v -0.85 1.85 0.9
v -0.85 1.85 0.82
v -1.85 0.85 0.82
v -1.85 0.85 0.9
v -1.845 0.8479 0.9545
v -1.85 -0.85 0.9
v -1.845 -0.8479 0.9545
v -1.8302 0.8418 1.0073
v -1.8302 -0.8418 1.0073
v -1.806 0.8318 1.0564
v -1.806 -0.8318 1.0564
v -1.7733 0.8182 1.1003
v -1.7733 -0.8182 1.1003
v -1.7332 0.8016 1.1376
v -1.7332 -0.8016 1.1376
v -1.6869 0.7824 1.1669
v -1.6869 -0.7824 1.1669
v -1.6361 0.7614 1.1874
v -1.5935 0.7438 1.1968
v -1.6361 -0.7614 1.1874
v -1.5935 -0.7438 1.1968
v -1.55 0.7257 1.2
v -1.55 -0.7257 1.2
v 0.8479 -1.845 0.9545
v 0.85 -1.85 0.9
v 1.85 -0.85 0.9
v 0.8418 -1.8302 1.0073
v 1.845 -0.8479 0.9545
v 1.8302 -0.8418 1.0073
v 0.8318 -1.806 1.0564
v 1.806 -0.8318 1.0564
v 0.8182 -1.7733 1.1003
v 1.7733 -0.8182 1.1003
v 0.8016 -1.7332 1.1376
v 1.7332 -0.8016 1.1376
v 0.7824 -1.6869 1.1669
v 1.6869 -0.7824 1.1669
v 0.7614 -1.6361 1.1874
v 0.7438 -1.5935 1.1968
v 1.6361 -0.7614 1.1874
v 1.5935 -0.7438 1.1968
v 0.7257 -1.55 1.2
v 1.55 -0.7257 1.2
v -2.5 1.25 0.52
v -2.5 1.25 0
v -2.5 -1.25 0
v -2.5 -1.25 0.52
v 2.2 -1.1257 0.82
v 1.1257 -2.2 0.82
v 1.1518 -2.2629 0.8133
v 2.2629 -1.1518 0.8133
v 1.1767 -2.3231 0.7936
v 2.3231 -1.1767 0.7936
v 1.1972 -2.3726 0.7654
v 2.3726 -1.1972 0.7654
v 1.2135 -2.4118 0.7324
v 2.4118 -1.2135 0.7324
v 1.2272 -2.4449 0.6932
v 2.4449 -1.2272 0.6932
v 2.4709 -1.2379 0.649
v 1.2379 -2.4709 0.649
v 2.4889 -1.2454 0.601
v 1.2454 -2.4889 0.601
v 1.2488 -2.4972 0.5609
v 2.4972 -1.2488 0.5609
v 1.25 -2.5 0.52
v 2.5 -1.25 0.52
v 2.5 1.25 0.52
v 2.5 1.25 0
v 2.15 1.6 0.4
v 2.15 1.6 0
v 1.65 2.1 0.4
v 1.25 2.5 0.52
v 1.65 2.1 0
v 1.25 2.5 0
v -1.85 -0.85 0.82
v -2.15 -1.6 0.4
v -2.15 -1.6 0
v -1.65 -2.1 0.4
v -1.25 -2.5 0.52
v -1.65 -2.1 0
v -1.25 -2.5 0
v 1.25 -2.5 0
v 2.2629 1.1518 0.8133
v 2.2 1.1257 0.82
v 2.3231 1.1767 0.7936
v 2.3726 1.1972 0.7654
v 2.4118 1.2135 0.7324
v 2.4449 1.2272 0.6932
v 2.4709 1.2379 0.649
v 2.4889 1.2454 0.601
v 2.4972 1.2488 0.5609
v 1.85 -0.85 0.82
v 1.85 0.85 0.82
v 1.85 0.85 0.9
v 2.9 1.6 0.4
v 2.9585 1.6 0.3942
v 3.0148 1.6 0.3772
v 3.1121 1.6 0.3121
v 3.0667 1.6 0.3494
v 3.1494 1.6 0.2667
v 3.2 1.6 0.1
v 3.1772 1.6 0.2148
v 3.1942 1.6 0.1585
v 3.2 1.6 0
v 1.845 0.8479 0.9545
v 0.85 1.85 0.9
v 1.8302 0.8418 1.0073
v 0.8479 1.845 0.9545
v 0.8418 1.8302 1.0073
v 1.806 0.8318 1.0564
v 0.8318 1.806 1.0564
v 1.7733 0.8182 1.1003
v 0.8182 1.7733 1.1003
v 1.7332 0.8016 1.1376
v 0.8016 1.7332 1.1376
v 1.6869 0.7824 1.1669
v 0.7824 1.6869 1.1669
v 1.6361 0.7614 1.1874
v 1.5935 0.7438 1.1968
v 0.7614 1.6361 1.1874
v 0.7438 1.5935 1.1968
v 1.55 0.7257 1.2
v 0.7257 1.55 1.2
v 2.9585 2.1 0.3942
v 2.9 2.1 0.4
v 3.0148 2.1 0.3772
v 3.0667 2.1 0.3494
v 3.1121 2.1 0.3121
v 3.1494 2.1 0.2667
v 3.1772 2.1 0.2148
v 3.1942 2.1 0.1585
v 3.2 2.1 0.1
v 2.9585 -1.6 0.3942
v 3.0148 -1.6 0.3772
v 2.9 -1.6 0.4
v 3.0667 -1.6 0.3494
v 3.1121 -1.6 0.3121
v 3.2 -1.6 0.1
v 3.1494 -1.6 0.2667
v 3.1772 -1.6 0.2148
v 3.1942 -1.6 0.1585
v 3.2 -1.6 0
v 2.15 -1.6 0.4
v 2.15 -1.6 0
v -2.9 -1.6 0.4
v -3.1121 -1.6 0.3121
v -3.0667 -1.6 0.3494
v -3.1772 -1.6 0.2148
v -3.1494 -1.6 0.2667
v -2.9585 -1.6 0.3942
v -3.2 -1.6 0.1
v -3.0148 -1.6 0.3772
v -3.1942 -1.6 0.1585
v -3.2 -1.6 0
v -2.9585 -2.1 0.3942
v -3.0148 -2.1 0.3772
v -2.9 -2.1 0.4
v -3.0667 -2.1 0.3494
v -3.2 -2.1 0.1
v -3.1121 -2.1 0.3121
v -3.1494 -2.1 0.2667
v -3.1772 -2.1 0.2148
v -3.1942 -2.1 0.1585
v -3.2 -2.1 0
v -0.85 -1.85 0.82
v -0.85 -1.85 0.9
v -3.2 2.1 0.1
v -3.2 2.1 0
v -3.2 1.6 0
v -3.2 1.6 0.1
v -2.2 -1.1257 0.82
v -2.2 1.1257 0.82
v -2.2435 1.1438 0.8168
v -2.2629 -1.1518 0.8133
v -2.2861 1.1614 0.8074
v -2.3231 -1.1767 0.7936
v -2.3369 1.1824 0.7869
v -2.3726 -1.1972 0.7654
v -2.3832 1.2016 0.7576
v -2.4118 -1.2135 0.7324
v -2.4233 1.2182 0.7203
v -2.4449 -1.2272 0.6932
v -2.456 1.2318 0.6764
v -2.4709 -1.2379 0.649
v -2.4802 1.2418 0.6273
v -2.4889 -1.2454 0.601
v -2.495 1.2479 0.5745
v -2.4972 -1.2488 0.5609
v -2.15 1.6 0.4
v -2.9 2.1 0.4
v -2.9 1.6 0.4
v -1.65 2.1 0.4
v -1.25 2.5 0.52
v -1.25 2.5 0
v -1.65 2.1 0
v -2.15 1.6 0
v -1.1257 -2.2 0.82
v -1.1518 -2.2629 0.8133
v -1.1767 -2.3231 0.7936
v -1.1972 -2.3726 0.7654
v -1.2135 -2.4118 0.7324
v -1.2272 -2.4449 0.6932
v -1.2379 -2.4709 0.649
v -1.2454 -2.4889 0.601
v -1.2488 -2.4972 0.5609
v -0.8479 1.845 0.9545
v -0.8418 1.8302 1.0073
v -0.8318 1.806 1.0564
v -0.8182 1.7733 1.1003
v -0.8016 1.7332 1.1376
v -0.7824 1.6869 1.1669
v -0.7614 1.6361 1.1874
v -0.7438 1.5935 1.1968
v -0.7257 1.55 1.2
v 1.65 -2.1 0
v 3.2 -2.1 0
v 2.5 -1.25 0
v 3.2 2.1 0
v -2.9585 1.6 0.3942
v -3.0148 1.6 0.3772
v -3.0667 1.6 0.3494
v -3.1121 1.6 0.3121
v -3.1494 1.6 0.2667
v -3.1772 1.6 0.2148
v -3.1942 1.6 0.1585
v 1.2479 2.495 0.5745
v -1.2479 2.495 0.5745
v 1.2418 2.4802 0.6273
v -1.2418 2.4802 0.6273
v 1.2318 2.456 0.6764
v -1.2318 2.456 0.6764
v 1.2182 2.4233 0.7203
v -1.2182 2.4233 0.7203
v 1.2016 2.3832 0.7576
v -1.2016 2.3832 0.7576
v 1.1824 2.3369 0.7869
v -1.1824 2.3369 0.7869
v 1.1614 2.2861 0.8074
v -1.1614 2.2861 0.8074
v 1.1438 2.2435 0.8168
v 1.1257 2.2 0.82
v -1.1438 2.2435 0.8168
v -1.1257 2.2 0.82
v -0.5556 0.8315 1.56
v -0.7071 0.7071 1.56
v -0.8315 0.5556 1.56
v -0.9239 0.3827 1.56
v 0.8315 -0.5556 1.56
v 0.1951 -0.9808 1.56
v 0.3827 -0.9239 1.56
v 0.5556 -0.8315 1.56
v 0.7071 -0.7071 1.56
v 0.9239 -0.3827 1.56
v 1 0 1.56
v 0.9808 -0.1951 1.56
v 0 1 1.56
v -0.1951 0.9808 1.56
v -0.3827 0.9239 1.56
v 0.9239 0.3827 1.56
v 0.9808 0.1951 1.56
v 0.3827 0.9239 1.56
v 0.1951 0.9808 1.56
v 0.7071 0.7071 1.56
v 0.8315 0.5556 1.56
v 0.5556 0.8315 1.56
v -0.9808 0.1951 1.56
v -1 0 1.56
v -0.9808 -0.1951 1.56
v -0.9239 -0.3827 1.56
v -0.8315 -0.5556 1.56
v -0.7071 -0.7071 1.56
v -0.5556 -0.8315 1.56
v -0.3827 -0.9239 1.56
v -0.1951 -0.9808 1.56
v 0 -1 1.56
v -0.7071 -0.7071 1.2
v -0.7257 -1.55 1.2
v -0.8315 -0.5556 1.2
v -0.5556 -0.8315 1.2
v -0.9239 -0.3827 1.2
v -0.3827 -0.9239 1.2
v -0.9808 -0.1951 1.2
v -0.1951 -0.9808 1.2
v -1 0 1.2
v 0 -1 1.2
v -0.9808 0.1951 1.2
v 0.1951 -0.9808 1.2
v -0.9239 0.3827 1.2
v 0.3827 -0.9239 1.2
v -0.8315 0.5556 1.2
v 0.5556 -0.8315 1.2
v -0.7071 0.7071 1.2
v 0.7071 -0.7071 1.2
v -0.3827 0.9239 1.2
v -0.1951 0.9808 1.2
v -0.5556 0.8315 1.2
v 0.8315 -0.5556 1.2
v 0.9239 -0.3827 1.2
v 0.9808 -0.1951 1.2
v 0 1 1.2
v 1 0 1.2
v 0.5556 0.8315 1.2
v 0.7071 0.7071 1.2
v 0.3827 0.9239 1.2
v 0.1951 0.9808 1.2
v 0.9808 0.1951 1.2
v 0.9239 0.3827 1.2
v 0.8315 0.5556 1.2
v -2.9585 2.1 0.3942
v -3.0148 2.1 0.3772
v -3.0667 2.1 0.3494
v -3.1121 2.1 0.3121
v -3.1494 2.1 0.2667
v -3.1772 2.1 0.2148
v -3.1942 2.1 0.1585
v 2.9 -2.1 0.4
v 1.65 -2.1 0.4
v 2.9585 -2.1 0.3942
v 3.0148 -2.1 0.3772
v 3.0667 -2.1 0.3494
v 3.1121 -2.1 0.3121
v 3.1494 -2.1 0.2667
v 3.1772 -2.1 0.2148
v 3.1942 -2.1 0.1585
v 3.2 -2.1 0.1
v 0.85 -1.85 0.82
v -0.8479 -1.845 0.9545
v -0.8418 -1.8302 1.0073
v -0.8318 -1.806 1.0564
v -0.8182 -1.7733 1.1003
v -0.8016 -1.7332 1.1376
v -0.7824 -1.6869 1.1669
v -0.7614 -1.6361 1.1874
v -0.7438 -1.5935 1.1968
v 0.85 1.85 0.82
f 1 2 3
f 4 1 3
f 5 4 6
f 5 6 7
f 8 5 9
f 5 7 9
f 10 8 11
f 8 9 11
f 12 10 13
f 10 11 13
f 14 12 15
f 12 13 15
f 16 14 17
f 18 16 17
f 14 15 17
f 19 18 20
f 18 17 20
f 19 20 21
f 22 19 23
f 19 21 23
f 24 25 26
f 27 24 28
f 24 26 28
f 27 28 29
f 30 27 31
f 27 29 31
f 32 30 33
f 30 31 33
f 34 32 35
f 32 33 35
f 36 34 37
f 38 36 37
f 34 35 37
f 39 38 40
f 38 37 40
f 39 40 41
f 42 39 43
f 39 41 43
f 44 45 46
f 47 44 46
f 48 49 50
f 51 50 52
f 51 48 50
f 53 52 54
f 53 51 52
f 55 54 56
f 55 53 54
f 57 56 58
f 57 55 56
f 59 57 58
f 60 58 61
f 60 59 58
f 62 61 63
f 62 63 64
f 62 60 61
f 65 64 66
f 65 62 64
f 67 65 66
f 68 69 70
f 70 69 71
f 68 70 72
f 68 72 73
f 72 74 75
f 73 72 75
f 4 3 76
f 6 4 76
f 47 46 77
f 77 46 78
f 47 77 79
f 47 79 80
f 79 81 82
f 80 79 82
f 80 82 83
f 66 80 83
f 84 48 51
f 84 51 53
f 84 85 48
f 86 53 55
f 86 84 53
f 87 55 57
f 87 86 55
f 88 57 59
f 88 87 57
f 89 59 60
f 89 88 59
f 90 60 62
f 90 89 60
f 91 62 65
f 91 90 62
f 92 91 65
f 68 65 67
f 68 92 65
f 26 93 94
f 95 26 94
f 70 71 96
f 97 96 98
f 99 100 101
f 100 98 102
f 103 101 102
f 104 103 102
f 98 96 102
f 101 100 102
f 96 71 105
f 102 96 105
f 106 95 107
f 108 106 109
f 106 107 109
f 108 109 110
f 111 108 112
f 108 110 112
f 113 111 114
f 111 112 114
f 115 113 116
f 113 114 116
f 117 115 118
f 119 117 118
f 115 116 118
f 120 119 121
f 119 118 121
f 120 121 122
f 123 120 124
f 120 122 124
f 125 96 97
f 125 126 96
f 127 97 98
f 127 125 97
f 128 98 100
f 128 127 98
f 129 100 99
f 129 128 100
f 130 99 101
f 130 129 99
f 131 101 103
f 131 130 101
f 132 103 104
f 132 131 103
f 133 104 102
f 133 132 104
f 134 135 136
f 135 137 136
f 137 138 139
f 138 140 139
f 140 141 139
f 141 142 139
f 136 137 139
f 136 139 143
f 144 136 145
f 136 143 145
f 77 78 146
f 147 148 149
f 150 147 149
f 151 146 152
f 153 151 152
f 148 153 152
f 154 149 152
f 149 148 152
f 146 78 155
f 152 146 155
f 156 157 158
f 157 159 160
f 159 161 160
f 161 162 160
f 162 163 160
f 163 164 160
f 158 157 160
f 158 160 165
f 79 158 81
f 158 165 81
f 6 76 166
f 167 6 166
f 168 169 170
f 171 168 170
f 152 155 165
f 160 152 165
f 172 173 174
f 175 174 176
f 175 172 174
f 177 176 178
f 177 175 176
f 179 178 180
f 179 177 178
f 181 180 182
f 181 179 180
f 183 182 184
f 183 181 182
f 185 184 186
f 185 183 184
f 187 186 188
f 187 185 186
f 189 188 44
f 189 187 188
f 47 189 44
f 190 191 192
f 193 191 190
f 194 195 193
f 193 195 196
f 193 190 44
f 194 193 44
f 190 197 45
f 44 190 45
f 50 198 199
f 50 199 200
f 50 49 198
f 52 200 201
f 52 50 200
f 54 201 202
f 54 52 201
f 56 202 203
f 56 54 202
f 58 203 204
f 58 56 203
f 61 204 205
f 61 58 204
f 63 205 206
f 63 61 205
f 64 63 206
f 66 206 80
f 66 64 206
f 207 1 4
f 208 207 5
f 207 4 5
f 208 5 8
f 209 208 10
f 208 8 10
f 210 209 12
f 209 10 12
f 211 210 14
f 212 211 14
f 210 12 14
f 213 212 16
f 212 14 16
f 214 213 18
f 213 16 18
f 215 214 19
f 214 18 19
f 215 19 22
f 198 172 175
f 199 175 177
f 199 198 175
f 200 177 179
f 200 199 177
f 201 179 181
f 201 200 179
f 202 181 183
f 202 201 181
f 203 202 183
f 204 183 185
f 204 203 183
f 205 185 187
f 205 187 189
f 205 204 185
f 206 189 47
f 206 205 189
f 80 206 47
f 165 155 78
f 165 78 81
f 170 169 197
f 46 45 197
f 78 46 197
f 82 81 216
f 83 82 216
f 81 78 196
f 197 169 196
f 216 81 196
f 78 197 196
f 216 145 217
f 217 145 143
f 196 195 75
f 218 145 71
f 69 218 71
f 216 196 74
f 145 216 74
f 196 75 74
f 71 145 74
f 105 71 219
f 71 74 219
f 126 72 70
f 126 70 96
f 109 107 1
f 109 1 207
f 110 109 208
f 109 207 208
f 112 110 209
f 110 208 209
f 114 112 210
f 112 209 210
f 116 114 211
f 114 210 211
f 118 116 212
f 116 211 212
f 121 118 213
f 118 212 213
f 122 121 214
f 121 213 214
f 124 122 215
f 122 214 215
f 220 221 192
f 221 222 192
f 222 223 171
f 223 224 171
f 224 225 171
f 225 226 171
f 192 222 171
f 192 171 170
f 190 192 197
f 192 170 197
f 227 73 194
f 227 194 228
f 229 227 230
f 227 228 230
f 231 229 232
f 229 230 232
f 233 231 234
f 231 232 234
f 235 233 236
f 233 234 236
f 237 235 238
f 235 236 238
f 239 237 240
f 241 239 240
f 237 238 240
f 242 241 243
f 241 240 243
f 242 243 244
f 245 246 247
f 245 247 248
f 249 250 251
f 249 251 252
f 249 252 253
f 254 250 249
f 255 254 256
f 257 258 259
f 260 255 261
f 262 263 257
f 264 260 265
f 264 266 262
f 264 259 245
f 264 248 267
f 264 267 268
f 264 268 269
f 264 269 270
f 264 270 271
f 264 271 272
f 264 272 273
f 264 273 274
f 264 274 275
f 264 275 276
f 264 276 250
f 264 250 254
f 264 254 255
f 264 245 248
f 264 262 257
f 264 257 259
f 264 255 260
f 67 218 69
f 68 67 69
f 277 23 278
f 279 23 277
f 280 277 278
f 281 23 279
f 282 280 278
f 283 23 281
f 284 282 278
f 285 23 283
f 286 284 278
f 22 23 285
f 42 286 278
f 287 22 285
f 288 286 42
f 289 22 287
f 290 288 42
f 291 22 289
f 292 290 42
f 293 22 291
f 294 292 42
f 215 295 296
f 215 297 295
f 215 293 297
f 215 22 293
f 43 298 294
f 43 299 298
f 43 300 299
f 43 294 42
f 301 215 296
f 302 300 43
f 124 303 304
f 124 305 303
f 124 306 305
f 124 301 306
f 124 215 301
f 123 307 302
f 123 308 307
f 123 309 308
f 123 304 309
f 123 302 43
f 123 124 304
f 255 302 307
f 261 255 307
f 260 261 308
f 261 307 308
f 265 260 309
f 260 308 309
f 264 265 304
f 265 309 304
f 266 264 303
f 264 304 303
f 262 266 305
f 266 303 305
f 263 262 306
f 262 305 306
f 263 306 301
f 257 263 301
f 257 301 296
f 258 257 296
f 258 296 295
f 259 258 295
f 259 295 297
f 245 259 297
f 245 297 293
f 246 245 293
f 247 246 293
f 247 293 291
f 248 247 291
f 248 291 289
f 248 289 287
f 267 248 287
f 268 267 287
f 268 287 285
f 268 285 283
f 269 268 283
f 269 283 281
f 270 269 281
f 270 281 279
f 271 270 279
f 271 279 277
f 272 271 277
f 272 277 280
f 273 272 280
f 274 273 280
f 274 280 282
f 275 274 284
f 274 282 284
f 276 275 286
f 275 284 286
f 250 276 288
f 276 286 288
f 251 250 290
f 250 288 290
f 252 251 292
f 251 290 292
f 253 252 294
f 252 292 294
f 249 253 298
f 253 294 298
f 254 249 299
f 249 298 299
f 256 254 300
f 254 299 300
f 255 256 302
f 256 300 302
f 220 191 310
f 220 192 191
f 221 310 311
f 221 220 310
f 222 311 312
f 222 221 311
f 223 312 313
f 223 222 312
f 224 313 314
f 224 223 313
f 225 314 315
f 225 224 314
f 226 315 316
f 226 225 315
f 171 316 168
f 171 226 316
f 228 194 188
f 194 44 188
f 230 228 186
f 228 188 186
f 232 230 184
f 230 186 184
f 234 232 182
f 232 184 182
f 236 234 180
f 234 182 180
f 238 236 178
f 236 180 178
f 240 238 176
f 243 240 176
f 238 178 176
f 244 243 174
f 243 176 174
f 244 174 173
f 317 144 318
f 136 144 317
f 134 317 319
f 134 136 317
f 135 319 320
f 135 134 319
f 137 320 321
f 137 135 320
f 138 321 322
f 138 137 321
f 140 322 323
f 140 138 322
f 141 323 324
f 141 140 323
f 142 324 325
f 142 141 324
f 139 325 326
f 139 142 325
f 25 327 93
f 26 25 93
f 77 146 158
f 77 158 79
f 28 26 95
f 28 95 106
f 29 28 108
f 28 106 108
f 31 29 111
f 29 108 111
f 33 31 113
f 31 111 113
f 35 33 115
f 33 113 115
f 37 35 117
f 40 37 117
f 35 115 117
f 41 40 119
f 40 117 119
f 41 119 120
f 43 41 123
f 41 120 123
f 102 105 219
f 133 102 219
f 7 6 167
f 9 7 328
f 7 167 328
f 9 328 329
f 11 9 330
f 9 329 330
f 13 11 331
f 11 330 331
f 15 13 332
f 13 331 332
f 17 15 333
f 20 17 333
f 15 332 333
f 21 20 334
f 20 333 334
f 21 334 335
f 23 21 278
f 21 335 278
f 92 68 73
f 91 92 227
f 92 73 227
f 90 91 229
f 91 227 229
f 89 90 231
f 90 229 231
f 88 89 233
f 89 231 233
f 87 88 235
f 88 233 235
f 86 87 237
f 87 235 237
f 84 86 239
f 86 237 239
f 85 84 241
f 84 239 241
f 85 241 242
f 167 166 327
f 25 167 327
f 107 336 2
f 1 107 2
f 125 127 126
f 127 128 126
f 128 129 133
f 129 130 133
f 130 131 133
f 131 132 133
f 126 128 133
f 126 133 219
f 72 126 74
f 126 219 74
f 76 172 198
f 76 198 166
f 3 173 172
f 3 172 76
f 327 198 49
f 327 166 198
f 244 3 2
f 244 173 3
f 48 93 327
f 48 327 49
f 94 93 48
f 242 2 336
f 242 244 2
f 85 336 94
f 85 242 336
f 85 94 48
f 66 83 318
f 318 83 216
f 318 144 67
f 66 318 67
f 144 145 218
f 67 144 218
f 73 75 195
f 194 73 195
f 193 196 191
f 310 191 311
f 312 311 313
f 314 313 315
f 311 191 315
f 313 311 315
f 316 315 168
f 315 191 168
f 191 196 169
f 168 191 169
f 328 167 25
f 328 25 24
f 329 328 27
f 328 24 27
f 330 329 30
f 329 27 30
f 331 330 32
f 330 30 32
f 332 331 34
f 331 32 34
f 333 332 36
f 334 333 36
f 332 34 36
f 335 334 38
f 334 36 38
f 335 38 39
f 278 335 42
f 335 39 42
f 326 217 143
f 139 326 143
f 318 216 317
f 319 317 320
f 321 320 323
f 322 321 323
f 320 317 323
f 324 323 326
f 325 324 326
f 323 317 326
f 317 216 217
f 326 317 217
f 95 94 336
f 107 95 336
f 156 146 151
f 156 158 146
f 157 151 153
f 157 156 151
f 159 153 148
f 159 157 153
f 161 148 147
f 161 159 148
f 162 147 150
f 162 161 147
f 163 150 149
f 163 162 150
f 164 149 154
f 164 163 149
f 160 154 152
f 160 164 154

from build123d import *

# Parameters (mm, degrees)
F0_R     = 1
F1_DEPTH = 1.56
F2_DEPTH = 1.2
F3_DEPTH = 0.82
F4_DEPTH = 0.4
F5_R     = 0.3


with BuildPart() as f1:
    # F0 (on Top) → F1 (new body)
    with BuildSketch(Plane.XY):
        Circle(F0_R)
    extrude(amount=F1_DEPTH)

    # F0 (on Top) → F2 (join)
    with BuildSketch(Plane.XY):
        Polygon((0.85, 1.85), (-0.85, 1.85), (-1.85, 0.85), (-1.85, -0.85), (-0.85, -1.85), (0.85, -1.85), (1.85, -0.85), (1.85, 0.85), align=None)
        Circle(F0_R, mode=Mode.SUBTRACT)
    extrude(amount=F2_DEPTH)

    # F0 (on Top) → F3 (join)
    with BuildSketch(Plane.XY):
        Polygon((1.25, 2.5), (-1.25, 2.5), (-1.65, 2.1), (-2.15, 1.6), (-2.5, 1.25), (-2.5, -1.25), (-2.15, -1.6), (-1.65, -2.1), (-1.25, -2.5), (1.25, -2.5), (1.65, -2.1), (2.15, -1.6), (2.5, -1.25), (2.5, 1.25), (2.15, 1.6), (1.65, 2.1), align=None)
        Polygon((-1.85, 0.85), (-0.85, 1.85), (0.85, 1.85), (1.85, 0.85), (1.85, -0.85), (0.85, -1.85), (-0.85, -1.85), (-1.85, -0.85), align=None, mode=Mode.SUBTRACT)
    extrude(amount=F3_DEPTH)

    # F0 (on Top) → F4 (join)
    with BuildSketch(Plane.XY):
        Polygon((-2.15, 1.6), (-1.65, 2.1), (-3.2, 2.1), (-3.2, 1.6), align=None)
        Polygon((-1.65, -2.1), (-2.15, -1.6), (-3.2, -1.6), (-3.2, -2.1), align=None)
        Polygon((3.2, -1.6), (2.15, -1.6), (1.65, -2.1), (3.2, -2.1), align=None)
        Polygon((3.2, 2.1), (1.65, 2.1), (2.15, 1.6), (3.2, 1.6), align=None)
    extrude(amount=F4_DEPTH)

    # F5
    f5_edges = [f1.edges().sort_by_distance(p)[0] for p in [
        (-1.35, 1.35, 1.2),
        (-1.85, 0, 1.2),
        (-1.35, -1.35, 1.2),
        (0, -1.85, 1.2),
        (1.35, -1.35, 1.2),
        (1.85, 0, 1.2),
        (1.35, 1.35, 1.2),
        (0, 1.85, 1.2),
        (-1.875, 1.875, 0.82),
        (-2.5, 0, 0.82),
        (-1.875, -1.875, 0.82),
        (0, -2.5, 0.82),
        (1.875, -1.875, 0.82),
        (2.5, 0, 0.82),
        (1.875, 1.875, 0.82),
        (0, 2.5, 0.82),
        (-3.2, 1.85, 0.4),
        (-3.2, -1.85, 0.4),
        (3.2, -1.85, 0.4),
        (3.2, 1.85, 0.4),
    ]]
    fillet(f5_edges, radius=F5_R)


solid = f1.part
